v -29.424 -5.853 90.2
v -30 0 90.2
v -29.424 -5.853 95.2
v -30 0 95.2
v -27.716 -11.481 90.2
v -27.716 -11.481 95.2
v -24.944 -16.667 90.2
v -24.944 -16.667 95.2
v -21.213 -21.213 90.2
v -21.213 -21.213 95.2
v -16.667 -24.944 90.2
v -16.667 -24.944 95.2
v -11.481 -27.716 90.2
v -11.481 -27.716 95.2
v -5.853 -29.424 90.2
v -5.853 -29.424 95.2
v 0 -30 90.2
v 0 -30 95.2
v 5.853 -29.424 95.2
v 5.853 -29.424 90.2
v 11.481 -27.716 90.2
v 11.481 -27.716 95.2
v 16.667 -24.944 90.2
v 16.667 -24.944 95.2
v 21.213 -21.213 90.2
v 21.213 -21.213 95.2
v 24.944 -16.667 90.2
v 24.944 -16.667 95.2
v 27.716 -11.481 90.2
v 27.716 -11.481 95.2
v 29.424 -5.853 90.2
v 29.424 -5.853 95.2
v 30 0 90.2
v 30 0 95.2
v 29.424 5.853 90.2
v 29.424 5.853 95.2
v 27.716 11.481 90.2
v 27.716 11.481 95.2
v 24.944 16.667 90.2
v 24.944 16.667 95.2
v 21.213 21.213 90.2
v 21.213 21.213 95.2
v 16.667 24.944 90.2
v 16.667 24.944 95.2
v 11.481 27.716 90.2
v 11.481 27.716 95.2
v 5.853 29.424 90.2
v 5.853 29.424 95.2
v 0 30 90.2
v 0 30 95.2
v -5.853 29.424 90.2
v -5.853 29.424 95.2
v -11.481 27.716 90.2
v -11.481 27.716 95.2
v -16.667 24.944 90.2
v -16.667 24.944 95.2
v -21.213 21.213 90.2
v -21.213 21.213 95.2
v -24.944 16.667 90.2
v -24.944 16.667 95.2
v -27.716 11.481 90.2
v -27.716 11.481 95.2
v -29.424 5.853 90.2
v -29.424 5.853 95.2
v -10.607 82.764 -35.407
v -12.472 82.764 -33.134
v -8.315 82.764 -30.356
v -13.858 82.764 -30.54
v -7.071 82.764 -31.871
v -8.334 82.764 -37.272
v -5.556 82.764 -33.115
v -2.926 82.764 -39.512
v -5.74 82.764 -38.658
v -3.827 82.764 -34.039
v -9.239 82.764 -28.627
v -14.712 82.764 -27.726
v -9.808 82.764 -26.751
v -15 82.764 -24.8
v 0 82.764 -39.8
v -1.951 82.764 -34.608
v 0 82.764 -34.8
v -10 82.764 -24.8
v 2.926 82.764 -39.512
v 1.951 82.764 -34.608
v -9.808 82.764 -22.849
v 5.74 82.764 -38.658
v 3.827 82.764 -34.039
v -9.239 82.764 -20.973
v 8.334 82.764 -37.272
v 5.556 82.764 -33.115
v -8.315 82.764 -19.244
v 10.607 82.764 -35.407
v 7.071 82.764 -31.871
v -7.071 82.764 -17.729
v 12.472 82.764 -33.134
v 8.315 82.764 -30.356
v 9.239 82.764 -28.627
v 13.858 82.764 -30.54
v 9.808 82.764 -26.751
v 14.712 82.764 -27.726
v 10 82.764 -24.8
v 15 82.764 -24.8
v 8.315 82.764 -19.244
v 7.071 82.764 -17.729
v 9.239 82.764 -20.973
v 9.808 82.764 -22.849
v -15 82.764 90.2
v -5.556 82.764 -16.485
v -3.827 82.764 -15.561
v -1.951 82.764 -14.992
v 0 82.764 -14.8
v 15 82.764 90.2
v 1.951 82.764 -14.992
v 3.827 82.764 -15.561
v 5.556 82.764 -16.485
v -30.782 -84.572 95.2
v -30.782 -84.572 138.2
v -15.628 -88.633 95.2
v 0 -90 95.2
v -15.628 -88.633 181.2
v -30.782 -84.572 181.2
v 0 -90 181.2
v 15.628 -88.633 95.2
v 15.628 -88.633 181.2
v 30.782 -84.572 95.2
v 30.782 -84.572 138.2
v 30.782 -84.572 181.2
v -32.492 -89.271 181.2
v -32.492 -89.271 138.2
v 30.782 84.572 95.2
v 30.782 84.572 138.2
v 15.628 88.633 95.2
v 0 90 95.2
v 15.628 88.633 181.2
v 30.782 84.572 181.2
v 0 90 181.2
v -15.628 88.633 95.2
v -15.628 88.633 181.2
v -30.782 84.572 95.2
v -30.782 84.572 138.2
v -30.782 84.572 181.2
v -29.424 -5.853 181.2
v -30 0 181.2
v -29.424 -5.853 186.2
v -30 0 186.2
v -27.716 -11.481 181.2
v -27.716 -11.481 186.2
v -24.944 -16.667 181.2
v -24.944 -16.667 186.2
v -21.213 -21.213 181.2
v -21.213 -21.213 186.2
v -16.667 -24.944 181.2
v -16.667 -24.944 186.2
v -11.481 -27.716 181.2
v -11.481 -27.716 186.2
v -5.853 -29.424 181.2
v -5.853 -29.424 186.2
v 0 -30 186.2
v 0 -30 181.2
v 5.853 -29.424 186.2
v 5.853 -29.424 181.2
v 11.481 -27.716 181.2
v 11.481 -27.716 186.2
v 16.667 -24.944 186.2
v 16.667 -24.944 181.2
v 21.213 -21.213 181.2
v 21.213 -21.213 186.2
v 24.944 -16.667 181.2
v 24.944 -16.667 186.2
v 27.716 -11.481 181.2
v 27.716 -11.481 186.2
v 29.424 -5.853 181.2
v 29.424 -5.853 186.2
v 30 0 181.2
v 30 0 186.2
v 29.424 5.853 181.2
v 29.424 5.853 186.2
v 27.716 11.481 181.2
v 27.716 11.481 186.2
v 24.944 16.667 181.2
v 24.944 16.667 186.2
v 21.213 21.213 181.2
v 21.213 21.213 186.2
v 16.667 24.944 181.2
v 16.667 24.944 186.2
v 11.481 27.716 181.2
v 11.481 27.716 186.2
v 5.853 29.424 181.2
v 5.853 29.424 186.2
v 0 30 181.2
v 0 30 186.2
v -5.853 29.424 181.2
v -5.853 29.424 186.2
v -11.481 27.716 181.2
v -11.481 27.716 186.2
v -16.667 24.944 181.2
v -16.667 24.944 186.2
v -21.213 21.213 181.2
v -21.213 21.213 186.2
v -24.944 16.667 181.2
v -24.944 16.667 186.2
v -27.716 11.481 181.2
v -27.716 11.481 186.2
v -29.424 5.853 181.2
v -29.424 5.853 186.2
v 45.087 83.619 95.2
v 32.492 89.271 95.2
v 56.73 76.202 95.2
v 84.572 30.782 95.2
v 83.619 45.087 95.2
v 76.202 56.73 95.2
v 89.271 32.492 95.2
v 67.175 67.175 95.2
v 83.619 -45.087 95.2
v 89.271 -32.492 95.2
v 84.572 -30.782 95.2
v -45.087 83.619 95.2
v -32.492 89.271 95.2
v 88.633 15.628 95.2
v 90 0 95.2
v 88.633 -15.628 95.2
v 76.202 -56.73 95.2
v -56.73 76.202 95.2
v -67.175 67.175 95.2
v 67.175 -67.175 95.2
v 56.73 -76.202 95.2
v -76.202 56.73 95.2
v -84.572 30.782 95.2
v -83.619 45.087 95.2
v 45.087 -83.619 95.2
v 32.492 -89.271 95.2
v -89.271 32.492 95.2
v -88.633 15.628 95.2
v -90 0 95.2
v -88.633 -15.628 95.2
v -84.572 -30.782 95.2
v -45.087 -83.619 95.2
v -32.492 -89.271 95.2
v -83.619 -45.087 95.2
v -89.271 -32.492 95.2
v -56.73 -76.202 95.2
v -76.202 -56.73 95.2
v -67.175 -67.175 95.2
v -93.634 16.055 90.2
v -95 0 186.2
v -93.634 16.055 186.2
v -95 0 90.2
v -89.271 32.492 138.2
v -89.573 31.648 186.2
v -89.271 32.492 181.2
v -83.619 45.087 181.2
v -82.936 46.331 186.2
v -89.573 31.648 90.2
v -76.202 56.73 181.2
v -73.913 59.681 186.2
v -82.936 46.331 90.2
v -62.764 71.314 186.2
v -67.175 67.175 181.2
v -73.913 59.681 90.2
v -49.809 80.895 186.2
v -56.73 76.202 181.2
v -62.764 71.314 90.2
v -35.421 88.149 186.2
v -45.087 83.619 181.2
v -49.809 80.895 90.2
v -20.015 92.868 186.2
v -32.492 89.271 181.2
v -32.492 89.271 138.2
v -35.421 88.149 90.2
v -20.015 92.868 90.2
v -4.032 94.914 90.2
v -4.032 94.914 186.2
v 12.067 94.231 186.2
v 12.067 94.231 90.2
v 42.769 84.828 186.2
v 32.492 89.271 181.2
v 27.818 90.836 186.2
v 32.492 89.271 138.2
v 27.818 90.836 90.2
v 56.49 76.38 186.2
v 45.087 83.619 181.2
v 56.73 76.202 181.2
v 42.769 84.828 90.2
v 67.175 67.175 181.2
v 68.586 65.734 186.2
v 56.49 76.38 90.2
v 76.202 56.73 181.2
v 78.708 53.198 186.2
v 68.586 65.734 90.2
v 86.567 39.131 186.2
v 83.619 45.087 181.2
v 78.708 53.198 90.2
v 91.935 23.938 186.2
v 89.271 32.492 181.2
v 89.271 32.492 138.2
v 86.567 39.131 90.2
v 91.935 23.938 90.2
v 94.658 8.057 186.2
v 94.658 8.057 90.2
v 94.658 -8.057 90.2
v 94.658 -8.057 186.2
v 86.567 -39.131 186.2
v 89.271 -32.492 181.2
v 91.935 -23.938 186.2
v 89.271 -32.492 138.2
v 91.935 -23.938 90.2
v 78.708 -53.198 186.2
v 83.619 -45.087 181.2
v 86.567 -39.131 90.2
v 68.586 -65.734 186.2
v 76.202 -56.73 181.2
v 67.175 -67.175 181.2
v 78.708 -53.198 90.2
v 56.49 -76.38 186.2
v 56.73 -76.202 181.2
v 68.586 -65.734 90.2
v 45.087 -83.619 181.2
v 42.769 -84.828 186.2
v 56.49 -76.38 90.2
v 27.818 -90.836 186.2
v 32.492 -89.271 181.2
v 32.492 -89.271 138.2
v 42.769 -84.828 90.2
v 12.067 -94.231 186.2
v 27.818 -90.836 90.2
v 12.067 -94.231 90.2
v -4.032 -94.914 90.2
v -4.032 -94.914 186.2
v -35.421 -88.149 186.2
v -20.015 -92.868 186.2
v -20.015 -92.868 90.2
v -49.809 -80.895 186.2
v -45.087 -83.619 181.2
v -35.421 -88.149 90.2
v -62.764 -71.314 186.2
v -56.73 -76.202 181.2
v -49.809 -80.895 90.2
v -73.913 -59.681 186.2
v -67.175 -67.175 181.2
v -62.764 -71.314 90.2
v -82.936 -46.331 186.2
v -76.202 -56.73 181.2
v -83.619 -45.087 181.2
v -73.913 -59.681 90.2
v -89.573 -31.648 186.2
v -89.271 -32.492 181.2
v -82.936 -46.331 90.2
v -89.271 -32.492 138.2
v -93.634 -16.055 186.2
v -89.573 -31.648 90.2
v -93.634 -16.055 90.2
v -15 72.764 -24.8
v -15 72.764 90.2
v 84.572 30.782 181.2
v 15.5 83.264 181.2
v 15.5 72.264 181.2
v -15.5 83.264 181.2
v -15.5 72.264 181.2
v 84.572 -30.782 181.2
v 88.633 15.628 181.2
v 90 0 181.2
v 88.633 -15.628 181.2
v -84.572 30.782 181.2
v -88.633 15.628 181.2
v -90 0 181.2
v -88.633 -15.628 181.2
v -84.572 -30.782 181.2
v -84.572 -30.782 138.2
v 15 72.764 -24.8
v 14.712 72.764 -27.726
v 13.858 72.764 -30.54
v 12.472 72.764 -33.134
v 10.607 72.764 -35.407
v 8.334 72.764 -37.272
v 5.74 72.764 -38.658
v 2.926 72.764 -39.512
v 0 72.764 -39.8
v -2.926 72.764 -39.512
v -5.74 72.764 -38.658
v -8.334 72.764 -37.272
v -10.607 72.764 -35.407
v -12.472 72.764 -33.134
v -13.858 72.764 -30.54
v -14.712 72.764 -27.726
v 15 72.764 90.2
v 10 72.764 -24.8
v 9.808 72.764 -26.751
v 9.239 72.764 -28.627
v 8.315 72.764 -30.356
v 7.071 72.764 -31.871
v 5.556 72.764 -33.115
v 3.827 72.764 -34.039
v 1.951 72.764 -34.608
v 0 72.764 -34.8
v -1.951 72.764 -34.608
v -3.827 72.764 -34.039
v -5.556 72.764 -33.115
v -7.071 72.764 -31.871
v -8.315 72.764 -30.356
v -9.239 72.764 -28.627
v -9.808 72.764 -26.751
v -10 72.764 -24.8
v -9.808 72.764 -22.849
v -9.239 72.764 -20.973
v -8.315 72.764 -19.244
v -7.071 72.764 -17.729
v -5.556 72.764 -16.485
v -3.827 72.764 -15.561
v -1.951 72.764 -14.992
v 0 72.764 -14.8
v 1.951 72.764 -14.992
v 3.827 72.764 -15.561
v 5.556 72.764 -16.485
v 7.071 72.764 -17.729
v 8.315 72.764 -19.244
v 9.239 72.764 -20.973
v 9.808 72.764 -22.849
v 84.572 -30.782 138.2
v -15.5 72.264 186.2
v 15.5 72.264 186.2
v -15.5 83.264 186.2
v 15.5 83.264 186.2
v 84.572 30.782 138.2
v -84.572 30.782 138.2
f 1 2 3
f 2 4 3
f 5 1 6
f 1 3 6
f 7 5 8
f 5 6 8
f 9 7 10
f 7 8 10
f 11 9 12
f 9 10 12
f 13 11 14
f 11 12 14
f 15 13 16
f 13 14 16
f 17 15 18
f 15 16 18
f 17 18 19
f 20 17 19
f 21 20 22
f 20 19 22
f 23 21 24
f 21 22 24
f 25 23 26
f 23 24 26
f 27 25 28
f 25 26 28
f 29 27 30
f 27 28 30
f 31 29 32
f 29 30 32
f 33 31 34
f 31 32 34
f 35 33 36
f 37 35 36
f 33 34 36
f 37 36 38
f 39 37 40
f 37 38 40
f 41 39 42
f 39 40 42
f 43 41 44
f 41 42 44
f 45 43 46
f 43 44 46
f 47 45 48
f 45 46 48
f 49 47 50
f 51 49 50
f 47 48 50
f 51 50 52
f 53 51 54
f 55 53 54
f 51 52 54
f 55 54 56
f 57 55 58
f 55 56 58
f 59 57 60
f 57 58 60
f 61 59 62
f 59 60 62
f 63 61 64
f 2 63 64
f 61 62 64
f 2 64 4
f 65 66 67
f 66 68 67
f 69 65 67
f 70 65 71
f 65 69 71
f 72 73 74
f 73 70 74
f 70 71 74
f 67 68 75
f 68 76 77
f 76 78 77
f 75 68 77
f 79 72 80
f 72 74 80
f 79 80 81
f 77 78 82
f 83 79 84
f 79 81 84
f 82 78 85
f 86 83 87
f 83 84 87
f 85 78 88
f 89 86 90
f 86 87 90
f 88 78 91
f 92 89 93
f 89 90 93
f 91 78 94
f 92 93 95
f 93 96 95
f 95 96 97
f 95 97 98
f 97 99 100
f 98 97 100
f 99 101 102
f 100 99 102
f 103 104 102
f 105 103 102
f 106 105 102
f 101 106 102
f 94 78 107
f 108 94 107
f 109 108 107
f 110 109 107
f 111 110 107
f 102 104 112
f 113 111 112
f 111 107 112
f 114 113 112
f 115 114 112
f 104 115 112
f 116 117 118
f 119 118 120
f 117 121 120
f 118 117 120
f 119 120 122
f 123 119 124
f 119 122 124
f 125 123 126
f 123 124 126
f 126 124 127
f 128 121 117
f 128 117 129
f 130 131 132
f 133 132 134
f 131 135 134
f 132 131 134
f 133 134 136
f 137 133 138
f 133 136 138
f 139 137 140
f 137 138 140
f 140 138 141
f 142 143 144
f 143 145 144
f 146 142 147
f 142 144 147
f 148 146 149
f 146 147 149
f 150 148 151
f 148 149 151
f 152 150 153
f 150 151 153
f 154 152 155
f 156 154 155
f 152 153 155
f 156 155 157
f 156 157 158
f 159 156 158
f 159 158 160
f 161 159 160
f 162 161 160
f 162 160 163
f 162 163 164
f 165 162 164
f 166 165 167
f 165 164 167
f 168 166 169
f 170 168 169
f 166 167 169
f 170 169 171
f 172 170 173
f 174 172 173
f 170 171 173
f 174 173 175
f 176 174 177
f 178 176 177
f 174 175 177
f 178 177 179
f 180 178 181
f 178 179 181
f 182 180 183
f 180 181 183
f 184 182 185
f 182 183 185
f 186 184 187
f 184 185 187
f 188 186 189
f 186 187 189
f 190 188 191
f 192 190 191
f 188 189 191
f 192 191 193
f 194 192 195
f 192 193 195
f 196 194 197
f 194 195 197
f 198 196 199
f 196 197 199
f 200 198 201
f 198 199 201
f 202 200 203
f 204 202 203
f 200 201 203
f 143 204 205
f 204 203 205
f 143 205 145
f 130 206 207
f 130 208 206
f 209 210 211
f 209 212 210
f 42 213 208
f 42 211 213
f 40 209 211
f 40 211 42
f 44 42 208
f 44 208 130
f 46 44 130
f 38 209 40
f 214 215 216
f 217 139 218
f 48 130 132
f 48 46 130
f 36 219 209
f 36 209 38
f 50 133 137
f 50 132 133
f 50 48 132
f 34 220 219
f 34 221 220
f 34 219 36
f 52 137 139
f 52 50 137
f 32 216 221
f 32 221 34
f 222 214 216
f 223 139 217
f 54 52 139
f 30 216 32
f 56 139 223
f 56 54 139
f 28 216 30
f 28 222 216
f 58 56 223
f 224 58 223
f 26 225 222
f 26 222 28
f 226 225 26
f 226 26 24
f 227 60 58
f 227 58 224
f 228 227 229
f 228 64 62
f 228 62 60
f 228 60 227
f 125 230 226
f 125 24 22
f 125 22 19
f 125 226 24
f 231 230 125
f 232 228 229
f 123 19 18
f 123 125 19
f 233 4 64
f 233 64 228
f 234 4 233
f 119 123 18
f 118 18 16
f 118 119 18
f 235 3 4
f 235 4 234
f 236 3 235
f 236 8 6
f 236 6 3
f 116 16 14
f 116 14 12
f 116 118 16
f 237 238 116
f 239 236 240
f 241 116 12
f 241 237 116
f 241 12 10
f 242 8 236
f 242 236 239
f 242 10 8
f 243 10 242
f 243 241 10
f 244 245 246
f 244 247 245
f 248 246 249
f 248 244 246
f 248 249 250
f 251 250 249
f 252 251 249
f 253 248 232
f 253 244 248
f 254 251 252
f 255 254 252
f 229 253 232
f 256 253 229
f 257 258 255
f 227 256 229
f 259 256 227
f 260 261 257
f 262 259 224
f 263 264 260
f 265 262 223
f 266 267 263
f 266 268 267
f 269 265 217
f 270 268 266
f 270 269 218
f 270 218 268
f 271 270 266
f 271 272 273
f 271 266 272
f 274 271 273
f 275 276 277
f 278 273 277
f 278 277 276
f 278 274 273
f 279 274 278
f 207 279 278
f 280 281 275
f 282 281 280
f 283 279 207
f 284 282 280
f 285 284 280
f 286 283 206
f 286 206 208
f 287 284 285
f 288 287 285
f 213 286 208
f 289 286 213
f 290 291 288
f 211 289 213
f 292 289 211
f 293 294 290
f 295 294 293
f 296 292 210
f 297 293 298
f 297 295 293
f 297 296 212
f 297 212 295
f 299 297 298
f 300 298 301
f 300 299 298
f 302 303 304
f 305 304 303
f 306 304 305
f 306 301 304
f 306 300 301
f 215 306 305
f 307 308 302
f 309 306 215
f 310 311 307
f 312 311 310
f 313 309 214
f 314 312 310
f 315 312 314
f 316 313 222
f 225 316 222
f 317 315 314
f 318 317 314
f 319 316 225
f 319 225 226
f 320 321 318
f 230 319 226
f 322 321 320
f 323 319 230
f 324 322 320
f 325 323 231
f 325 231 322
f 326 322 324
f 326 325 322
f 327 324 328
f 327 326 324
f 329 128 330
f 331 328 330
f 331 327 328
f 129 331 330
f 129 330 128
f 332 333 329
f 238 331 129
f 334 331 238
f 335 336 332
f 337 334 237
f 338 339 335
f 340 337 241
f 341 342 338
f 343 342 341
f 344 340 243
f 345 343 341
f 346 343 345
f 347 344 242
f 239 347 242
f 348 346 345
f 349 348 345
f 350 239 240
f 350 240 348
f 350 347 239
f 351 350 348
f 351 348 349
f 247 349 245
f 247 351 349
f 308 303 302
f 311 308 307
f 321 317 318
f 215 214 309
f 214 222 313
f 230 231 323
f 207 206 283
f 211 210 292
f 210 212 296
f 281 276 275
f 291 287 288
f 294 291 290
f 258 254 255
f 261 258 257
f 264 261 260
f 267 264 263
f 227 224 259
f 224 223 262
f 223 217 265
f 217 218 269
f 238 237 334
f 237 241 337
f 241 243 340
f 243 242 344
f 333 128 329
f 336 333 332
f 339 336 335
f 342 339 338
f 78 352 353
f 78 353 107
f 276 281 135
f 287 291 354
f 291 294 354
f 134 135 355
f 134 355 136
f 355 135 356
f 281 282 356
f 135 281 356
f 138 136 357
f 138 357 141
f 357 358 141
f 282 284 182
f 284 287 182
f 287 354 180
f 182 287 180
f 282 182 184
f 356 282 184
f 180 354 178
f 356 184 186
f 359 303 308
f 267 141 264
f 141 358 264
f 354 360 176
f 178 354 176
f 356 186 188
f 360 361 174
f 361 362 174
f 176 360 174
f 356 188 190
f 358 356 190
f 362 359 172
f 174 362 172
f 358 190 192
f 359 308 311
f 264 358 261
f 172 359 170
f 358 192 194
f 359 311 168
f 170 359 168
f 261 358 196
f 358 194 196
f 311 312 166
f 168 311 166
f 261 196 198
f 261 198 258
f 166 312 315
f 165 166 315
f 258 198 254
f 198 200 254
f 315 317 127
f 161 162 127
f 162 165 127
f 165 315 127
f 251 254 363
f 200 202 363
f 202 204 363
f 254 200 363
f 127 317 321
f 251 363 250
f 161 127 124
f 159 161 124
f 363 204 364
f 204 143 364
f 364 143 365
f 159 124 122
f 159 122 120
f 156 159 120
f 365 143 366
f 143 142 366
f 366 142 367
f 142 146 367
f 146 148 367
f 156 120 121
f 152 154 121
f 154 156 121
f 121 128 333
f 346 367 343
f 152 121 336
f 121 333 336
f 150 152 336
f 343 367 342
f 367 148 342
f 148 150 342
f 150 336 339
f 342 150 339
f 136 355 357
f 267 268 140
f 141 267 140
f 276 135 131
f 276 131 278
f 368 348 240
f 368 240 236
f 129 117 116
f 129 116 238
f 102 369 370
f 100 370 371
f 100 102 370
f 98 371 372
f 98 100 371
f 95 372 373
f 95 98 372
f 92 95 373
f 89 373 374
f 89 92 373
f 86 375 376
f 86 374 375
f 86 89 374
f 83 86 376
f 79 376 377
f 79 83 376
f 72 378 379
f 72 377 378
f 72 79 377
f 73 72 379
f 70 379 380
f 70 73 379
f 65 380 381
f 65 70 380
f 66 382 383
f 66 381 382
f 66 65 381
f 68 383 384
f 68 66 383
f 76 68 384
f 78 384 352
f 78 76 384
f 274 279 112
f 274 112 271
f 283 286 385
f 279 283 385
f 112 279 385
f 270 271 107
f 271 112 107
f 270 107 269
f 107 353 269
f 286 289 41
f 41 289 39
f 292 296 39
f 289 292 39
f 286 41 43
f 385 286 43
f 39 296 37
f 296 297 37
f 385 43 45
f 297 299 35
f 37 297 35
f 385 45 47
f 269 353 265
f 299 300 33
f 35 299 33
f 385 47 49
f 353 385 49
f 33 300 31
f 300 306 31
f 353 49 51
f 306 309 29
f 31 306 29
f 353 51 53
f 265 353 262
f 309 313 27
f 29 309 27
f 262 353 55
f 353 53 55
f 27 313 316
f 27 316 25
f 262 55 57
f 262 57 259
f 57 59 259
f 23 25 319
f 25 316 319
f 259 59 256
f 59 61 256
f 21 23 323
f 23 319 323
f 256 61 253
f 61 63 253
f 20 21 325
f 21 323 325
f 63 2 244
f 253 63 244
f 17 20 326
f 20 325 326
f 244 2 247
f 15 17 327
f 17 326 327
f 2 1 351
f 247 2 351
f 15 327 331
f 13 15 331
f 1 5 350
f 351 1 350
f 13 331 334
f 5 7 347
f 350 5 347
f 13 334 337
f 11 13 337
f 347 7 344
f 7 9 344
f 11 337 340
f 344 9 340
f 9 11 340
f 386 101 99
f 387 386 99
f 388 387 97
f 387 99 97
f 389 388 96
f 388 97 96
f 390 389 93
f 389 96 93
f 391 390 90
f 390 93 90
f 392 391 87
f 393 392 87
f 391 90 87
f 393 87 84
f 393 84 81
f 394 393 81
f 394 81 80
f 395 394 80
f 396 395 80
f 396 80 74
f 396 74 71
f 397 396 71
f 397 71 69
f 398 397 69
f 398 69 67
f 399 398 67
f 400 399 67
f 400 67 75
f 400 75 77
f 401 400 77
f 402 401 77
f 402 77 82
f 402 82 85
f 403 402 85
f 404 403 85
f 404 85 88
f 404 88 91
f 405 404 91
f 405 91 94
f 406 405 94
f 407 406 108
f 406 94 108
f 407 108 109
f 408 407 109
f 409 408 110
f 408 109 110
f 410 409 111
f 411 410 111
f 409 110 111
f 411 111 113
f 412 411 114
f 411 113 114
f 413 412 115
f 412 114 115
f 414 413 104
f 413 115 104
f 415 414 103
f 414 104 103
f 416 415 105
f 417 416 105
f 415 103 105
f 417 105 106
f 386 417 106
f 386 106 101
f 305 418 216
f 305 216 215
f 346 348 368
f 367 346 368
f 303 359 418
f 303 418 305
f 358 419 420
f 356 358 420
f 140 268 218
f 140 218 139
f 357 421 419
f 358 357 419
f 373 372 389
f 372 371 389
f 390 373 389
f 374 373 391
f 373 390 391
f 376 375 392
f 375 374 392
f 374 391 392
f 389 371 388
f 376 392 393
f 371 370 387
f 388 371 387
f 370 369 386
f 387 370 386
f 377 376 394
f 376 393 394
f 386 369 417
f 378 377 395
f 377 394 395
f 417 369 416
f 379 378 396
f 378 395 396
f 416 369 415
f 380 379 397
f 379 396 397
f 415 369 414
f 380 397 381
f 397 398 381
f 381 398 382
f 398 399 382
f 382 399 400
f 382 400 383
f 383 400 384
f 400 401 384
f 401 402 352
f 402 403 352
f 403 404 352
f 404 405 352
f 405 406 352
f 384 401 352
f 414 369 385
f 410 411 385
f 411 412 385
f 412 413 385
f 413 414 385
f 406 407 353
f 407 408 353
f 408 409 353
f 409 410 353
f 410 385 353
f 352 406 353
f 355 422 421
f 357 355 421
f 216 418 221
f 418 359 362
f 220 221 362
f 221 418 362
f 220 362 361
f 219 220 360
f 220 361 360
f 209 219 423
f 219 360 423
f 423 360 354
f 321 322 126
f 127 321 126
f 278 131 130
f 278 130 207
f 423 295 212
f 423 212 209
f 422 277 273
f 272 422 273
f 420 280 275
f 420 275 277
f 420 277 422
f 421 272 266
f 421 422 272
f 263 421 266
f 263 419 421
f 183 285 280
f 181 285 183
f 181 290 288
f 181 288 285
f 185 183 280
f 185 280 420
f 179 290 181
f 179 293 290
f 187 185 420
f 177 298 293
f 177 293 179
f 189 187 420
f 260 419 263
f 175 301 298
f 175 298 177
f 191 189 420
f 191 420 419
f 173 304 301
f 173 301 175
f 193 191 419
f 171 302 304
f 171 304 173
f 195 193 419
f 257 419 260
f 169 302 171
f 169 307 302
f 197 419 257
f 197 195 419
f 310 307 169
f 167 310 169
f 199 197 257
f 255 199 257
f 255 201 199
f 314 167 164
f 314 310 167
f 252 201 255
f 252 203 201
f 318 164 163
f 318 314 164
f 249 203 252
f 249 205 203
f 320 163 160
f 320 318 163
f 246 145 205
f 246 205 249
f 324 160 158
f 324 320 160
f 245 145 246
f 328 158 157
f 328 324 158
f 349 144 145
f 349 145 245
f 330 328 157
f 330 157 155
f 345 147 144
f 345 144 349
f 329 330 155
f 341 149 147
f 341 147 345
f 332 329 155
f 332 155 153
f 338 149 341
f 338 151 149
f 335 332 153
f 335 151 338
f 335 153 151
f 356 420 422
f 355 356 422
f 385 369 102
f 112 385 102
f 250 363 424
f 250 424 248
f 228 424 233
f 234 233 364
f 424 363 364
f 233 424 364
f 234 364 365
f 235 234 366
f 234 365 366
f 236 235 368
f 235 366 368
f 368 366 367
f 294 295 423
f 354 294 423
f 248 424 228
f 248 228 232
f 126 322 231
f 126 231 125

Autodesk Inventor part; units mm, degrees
ref_plane "YZ Plane" through (0, 0, 0) normal (1, 0, 0) x (0, 1, 0)
ref_plane "XZ Plane" through (0, 0, 0) normal (0, 1, 0) x (-1, 0, 0)
ref_plane "XY Plane" through (0, 0, 0) normal (0, 0, 1) x (1, 0, 0)
sketch "Эскиз1" plane through (0, 0, 0) normal (0, 1, 0) x (-1, 0, 0)
  line L0 (30, 181.2) -> (30, 186.2)
  line L1 (30, 186.2) -> (95, 186.2)
  line L2 (95, 186.2) -> (95, 90.2)
  line L3 (95, 90.2) -> (30, 90.2)
  line L4 (30, 90.2) -> (30, 95.2)
  line L5 (30, 95.2) -> (90, 95.2)
  line L6 (90, 95.2) -> (90, 181.2)
  line L7 (90, 181.2) -> (30, 181.2)
  line L8 (0, -115.5707) -> (0, 259.8393)
  line L9 (70, 181.2) -> (-70, 181.2) projected
  point P0 (0, 0)
  dimension "d0" = 5
  dimension "d1" = 5
  dimension "d2" = 5
  dimension "d3" = 86
  dimension "d4" = 180
  dimension "d5" = 60
revolve "Вращение1" add sketch "Эскиз1" angle 360 about axis through (0, 0, -115.5707) along (0, 0, 1)
sketch "Эскиз2" plane through (0, 0, 186.2) normal (0, 0, 1) x (1, 0, 0)
  line L0 (-15, 72.7645) -> (-15, 82.7645) projected
  line L1 (15, 82.7645) -> (-15, 82.7645) projected
  line L2 (15, 72.7645) -> (15, 82.7645) projected
  line L3 (-15, 72.7645) -> (15, 72.7645) projected
  line L4 (-15.5, 83.2645) -> (-15.5, 72.2645)
  line L5 (-15.5, 72.2645) -> (15.5, 72.2645)
  line L6 (15.5, 72.2645) -> (15.5, 83.2645)
  line L7 (15.5, 83.2645) -> (-15.5, 83.2645)
  point P0 (0, 0)
  dimension "d7" = 0.5
extrude "Выдавливание1" cut sketch "Эскиз2" against normal blind 7 contours L0 L1 L2 L3 | L7 L6 L5 L4
sketch "Эскиз3" plane through (0, 0, 90.2) normal (0, 0, -1) x (-1, 0, 0)
  line L0 (15, 82.7645) -> (-15, 82.7645) projected
  line L1 (-15, 72.7645) -> (15, 72.7645) projected
  line L2 (15, 72.7645) -> (15, 82.7645) projected
  line L3 (-15, 72.7645) -> (-15, 82.7645) projected
  point P0 (0, 0)
extrude "Выдавливание2" add sketch "Эскиз3" along normal blind 130
sketch "Эскиз4" plane through (-15, 82.7645, 90.2) normal (0, 1, 0) x (1, 0, 0)
  line L0 (30, 0) -> (30, 130) projected
  line L1 (0, 0) -> (0, 130) projected
  arc A0 (30, 115) -> (0, 115) centre (15, 115) ccw
  line L2 (30, 130) -> (0, 130) projected
  circle A1 centre (15, 115) radius 10
  point P0 (15, 90.2)
  point P1 (15, 130)
  dimension "d15" = 20
extrude "Выдавливание3" cut sketch "Эскиз4" against normal blind 24.5
ref_plane "РабПлоскость1" through (0, 0, 138.2) normal (0, 0, -1) x (-1, 0, 0)
sketch "Эскиз5" plane through (0, 0, 138.2) normal (0, 0, -1) x (-1, 0, 0)
  line L0 (0, 0) -> (-41.3014, 113.4746)
  line L1 (-41.3014, 113.4746) -> (-113.4746, 41.3014)
  line L2 (-113.4746, 41.3014) -> (0, 0)
  line L3 (0, 0) -> (-77.388, 77.388) construction
  line L4 (0, 0) -> (-129.096, 0) construction
  dimension "d18" = 50
  dimension "d19" = 45
extrude "Выдавливание4" cut sketch "Эскиз5" along normal up to surface (43 mm away)
sketch "Эскиз6" plane through (0, 0, 138.2) normal (0, 0, -1) x (-1, 0, 0)
  arc A0 (-30.7818, 84.5723) -> (-84.5723, 30.7818) centre (0, 0) ccw projected
  line L0 (-30.7818, 84.5723) -> (-32.4919, 89.2708) projected
  arc A1 (-32.4919, 89.2708) -> (-89.2708, 32.4919) centre (0, 0) ccw projected
  line L1 (-89.2708, 32.4919) -> (-84.5723, 30.7818) projected
extrude "Выдавливание5" cut sketch "Эскиз6" against normal up to surface (43 mm away)
pattern_circular "Круговой массив1" count 4 over 360 about axis through (0, 0, 138.2) along (0, 0, -1) of "Выдавливание4", "Выдавливание5"
properties part number "outer_part"
